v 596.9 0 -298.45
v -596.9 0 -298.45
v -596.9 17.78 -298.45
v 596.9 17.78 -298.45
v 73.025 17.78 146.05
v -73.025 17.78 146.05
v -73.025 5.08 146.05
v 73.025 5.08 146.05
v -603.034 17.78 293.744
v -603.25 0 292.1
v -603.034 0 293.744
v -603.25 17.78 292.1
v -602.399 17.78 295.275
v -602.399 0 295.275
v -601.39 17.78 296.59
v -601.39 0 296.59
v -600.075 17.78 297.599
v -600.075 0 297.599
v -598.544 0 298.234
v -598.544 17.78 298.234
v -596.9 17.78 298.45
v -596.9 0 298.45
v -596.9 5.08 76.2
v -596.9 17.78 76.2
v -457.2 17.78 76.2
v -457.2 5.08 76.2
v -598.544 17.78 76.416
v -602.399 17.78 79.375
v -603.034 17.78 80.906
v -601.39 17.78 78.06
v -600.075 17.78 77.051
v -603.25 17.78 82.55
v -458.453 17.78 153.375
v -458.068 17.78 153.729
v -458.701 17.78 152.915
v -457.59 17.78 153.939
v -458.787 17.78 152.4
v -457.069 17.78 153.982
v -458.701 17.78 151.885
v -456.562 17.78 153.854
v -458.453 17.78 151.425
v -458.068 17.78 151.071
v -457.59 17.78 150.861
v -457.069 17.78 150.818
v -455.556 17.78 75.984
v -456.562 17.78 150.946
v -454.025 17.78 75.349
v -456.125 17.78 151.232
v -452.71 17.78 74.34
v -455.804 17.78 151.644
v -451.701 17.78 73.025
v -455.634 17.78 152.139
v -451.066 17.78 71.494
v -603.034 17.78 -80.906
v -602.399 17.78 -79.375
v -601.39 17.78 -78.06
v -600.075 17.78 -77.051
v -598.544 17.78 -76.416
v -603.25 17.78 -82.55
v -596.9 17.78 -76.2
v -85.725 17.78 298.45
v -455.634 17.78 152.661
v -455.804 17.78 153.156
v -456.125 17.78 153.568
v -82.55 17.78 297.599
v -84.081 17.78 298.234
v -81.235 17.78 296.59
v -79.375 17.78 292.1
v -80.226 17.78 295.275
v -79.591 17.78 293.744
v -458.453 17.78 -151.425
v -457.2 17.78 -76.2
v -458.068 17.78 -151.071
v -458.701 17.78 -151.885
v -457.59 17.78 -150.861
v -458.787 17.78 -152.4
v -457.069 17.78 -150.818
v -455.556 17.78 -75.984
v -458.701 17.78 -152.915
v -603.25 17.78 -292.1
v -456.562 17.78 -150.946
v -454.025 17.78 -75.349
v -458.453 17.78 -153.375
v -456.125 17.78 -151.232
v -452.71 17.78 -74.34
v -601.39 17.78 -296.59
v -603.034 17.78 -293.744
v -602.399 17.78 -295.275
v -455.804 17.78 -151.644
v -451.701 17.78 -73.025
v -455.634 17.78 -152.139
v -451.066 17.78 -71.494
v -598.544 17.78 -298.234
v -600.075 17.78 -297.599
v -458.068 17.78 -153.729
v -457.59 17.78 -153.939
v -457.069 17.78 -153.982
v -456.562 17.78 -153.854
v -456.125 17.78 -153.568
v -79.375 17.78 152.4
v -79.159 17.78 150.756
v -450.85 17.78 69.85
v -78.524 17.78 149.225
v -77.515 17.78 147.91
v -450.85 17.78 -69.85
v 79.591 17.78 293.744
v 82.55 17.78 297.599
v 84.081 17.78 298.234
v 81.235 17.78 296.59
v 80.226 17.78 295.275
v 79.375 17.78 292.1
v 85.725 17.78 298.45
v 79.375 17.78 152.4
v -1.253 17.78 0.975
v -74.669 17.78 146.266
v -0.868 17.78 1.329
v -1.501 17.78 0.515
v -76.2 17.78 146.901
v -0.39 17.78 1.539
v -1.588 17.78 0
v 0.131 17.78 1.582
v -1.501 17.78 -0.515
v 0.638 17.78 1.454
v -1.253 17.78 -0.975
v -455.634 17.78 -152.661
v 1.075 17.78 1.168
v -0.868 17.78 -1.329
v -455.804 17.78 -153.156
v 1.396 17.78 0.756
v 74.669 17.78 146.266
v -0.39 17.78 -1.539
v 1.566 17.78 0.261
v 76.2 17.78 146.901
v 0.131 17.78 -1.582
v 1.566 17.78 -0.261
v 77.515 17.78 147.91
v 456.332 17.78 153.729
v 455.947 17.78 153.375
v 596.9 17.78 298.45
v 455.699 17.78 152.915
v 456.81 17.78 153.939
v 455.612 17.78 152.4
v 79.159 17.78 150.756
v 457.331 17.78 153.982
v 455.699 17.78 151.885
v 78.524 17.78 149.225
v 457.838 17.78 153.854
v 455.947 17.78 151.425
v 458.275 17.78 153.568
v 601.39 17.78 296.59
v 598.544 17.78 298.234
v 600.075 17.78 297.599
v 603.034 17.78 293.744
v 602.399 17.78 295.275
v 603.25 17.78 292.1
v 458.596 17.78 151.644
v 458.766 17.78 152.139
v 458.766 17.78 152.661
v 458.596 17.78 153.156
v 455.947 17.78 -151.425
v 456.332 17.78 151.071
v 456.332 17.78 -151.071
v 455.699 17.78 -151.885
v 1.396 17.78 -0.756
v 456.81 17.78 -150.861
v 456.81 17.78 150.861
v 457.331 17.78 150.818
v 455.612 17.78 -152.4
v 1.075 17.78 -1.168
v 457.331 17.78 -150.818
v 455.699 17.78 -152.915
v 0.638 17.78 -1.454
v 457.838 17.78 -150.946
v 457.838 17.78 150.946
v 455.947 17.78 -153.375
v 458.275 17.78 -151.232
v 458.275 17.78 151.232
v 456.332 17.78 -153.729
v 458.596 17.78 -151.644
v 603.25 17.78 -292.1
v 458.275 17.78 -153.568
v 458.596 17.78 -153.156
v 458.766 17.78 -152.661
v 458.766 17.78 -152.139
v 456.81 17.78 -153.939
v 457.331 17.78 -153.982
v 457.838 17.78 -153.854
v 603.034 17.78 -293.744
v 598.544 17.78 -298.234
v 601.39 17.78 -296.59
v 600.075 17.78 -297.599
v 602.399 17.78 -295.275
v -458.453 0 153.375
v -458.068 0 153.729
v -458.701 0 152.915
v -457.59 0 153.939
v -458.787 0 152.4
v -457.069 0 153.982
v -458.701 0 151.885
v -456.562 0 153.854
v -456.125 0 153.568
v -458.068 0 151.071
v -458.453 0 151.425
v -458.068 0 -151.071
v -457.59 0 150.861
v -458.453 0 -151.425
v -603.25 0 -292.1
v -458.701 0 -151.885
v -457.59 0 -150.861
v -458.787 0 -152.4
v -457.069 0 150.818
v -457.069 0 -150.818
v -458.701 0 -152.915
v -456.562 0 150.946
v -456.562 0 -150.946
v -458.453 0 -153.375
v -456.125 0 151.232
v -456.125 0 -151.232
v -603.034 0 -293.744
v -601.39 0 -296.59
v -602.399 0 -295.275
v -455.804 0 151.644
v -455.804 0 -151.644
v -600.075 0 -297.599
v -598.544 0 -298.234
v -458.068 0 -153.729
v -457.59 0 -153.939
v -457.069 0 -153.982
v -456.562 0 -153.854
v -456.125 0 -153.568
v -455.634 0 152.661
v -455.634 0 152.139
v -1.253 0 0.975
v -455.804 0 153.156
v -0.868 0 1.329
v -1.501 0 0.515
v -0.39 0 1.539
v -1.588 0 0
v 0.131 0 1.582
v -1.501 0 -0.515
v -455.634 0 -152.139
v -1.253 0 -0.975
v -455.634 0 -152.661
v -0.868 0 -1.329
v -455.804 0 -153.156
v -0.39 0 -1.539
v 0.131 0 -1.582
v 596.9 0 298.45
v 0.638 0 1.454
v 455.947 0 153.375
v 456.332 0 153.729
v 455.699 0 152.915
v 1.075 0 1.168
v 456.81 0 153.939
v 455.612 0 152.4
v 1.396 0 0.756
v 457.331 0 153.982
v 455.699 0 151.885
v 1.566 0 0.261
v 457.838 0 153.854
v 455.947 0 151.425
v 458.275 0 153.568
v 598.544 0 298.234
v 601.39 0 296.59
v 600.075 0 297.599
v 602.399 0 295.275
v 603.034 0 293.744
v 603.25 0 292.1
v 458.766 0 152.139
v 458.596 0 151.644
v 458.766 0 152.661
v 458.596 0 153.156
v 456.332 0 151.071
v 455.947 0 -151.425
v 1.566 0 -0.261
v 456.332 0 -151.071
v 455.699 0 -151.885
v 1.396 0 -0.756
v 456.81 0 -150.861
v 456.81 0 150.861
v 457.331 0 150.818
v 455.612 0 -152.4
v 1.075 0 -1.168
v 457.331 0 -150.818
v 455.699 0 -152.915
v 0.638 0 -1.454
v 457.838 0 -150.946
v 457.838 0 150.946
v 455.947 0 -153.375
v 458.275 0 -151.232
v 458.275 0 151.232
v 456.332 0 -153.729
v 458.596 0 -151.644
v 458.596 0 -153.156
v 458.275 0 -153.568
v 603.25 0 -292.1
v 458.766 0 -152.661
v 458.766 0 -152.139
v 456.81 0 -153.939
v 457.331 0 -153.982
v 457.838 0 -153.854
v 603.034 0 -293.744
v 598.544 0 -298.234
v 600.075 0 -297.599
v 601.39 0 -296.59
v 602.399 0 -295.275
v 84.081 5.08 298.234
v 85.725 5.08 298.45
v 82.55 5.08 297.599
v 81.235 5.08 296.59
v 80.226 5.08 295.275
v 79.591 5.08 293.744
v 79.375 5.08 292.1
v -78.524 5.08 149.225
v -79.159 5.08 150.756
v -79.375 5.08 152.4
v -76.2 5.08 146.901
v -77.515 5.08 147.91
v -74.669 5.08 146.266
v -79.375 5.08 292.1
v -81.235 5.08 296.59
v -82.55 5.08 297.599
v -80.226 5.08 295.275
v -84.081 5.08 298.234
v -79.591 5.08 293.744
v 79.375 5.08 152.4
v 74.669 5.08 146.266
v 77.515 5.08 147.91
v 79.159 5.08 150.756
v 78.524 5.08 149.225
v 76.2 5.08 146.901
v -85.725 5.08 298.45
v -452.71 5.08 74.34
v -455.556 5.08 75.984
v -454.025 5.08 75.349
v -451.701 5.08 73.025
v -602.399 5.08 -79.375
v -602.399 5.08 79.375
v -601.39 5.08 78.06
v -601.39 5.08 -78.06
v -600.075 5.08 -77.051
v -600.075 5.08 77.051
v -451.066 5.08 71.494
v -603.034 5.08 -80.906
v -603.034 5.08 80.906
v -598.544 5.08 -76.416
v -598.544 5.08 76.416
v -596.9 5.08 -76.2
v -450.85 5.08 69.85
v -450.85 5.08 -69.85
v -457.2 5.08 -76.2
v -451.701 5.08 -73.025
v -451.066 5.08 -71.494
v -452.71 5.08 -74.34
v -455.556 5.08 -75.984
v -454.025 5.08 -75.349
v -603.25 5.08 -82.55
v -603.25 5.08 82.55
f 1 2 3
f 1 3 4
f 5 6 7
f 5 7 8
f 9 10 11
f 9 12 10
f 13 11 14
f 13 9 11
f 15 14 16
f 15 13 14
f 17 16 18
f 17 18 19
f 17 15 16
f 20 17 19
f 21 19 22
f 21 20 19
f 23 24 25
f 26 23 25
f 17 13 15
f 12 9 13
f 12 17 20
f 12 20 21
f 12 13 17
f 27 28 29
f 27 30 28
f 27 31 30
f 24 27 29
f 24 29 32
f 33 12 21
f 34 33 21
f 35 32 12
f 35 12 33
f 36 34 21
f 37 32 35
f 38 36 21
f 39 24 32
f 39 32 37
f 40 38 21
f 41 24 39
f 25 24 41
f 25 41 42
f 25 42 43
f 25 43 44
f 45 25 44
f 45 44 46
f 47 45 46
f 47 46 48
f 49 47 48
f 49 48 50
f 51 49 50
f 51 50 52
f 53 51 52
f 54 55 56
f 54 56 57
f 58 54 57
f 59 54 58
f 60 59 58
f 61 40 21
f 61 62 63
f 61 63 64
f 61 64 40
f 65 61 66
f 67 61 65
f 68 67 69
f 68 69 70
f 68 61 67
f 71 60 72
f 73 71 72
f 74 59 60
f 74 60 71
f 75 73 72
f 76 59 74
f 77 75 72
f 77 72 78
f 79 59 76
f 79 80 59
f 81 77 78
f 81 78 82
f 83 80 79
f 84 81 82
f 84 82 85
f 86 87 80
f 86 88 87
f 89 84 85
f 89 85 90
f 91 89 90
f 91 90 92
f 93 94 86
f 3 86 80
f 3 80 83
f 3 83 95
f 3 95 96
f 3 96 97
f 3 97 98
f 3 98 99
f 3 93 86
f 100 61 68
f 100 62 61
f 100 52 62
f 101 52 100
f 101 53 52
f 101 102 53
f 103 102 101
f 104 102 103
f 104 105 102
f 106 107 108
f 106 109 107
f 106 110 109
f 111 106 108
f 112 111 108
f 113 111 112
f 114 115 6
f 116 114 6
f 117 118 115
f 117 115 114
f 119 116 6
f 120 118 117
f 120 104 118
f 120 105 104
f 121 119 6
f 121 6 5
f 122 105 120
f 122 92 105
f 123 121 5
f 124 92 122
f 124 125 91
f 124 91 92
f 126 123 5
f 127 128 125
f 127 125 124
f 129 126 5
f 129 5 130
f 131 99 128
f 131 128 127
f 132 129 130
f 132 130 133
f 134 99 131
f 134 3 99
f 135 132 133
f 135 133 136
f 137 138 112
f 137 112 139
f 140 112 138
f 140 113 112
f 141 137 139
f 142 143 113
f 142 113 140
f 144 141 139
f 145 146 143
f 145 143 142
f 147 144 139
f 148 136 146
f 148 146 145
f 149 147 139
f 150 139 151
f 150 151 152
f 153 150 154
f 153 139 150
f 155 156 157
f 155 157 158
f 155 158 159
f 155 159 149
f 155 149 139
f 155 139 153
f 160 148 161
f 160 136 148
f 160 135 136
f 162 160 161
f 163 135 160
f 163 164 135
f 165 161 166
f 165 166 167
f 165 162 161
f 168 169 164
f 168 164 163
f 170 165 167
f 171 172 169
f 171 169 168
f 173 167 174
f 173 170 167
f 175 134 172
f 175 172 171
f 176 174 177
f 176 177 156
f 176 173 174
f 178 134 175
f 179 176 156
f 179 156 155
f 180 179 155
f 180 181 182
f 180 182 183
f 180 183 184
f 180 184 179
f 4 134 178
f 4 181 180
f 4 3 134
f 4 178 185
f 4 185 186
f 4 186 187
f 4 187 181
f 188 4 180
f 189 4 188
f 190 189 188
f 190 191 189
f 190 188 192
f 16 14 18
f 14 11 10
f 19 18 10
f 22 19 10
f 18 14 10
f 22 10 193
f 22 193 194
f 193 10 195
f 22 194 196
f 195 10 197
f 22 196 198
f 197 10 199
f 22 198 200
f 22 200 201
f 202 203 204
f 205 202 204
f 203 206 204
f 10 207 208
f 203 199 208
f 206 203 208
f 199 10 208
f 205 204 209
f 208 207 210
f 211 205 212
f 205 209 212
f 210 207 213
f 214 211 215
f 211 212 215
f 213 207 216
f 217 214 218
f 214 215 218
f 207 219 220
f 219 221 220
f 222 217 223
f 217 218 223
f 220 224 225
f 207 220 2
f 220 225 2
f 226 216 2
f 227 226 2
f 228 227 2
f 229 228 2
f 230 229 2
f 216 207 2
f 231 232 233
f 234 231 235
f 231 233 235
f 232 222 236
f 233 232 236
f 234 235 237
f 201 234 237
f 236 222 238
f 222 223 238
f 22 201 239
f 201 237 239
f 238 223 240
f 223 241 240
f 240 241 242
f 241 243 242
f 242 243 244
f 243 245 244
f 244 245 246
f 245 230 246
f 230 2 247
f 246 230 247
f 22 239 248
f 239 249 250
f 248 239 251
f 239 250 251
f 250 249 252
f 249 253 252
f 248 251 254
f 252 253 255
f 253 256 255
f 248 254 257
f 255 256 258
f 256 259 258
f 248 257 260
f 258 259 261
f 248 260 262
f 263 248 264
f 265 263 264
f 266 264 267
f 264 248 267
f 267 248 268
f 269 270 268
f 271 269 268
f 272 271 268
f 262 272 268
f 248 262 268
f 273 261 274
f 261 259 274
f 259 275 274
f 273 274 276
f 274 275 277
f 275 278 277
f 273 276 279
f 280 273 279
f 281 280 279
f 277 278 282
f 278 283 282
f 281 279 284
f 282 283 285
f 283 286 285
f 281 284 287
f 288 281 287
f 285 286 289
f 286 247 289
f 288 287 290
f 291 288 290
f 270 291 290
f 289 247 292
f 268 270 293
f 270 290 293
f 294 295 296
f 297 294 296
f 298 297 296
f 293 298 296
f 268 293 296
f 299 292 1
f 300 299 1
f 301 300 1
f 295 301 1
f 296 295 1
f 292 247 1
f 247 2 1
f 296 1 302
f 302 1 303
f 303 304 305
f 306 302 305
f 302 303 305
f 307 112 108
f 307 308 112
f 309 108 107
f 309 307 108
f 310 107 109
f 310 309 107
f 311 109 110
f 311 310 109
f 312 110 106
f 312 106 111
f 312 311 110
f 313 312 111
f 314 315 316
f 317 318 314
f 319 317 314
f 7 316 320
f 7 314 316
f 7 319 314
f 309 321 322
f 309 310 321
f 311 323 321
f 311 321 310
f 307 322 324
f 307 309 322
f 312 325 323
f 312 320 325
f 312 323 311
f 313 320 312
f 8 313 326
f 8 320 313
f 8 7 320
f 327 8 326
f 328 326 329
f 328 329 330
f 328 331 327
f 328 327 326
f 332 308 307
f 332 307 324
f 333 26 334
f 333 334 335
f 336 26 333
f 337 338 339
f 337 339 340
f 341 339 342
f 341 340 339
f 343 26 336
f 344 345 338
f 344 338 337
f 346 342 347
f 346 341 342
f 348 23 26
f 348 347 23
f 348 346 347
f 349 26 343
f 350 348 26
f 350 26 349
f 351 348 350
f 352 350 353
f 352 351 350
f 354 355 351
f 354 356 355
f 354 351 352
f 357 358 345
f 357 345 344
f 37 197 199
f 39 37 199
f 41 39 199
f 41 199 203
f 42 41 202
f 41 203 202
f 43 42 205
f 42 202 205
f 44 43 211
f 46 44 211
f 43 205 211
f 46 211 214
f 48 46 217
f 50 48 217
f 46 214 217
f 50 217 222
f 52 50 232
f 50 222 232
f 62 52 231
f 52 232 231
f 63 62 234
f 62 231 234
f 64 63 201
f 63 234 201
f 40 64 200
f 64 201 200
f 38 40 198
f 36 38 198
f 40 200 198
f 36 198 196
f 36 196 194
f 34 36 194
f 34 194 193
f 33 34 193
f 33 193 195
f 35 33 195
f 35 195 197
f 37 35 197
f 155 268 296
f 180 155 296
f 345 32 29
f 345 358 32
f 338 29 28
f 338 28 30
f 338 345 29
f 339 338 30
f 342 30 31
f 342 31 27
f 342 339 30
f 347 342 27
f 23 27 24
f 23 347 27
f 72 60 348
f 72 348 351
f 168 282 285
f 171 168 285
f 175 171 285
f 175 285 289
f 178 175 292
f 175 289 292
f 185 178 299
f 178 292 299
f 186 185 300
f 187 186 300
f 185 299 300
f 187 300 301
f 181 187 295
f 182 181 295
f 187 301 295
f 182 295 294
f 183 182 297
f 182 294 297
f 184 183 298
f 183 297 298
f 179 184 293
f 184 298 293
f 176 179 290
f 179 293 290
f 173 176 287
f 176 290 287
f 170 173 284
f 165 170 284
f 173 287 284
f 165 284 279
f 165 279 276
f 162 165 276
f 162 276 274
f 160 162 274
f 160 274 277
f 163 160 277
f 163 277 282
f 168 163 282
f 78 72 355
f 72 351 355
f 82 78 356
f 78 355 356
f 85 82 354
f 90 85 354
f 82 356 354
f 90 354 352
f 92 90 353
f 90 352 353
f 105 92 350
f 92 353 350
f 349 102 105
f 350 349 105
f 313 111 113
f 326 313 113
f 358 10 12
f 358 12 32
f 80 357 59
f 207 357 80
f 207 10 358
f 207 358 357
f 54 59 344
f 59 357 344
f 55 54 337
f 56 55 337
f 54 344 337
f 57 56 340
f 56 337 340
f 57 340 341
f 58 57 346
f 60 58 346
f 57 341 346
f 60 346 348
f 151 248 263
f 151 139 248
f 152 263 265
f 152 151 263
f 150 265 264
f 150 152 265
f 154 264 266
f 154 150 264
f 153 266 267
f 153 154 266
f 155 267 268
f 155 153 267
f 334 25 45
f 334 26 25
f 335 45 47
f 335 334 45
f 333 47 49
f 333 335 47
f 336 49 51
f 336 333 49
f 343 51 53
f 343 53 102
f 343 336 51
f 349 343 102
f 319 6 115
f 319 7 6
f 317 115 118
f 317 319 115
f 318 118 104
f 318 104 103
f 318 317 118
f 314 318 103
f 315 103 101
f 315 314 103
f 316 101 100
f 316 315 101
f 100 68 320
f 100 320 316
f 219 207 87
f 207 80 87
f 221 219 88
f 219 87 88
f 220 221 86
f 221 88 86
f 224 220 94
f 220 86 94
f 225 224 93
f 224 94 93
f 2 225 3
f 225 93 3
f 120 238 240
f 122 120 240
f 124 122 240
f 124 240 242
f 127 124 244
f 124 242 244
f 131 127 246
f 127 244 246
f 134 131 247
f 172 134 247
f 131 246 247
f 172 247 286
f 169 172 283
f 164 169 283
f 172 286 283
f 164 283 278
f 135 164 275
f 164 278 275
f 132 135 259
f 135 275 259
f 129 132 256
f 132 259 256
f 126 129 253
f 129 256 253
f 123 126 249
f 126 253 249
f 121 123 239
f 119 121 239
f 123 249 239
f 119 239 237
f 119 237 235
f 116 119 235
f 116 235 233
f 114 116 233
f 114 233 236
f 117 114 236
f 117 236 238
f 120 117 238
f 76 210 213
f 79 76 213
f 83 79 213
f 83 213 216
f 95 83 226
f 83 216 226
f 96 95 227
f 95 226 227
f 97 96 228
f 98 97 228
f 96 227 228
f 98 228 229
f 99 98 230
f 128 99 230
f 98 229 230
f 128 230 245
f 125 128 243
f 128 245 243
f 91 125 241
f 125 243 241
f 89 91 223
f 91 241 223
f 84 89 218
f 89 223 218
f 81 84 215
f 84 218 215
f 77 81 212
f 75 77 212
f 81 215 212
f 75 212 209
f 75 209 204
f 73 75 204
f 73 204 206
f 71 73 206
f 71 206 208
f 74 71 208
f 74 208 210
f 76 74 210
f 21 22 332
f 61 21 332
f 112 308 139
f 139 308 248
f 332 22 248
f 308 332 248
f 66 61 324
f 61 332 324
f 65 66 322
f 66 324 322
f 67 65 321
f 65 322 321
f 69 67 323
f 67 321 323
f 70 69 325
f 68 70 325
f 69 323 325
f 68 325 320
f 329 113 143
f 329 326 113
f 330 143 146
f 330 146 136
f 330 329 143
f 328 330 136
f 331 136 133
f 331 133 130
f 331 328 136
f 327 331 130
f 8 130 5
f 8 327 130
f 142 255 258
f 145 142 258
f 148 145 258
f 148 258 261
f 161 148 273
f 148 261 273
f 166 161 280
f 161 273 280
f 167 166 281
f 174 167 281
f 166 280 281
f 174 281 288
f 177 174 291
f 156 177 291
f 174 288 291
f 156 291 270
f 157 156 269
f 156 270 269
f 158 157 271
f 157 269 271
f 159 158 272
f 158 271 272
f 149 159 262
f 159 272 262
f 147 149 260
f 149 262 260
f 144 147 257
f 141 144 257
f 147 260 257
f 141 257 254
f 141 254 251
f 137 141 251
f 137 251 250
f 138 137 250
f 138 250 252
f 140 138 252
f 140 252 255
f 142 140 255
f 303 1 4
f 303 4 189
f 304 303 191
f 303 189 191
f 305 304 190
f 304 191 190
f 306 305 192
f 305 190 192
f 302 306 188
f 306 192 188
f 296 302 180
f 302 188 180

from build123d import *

# Parameters (mm, degrees)
SKETCH1_W                    = 1206.5
SKETCH1_H                    = 596.9
BOSS_EXTRUDE1_DEPTH          = 17.78
F_1_8_0_125_DIAMETER_HOLE1_D = 3.175
FILLET1_R                    = 6.35
SKETCH4_W                    = 158.75
SKETCH4_H                    = 152.4
SKETCH4_W_2                  = 152.4
CUT_EXTRUDE1_DEPTH           = 12.7
FILLET2_R                    = 6.35


with BuildPart() as part:
    # Sketch1 → Boss-Extrude1 (new body)
    with BuildSketch(Plane(origin=(0, 0, 0), x_dir=(1, 0, 0), z_dir=(0, 1, 0))):
        Rectangle(SKETCH1_W, SKETCH1_H)
    extrude(amount=BOSS_EXTRUDE1_DEPTH)

    # 1/8 (0.125) Diameter Hole1 (through all)
    with Locations(Plane(origin=(0, 17.78, 0), x_dir=(1, 0, 0), z_dir=(0, 1, 0))):
        with Locations((0, 0), (457.2, 152.4), (-457.2, -152.4), (-457.2, 152.4), (457.2, -152.4)):
            Hole(F_1_8_0_125_DIAMETER_HOLE1_D / 2)

    # Fillet1
    fillet1_edges = [part.edges().sort_by_distance(p)[0] for p in [
        (603.25, 8.89, 298.45),
        (-603.25, 8.89, 298.45),
        (-603.25, 8.89, -298.45),
        (603.25, 8.89, -298.45),
    ]]
    fillet(fillet1_edges, radius=FILLET1_R)

    # Sketch4 → Cut-Extrude1 (cut)
    with BuildSketch(Plane(origin=(0, 17.78, 0), x_dir=(1, 0, 0), z_dir=(0, 1, 0))):
        with Locations((0, -222.25)):
            Rectangle(SKETCH4_W, SKETCH4_H)
        with Locations((-527.05, 0)):
            Rectangle(SKETCH4_W_2, SKETCH4_H)
    extrude(amount=-CUT_EXTRUDE1_DEPTH, mode=Mode.SUBTRACT)

    # Fillet2
    fillet2_edges = [part.edges().sort_by_distance(p)[0] for p in [
        (79.375, 11.43, 146.05),
        (79.375, 11.43, 298.45),
        (-79.375, 11.43, 298.45),
        (-79.375, 11.43, 146.05),
        (-603.25, 11.43, 76.2),
        (-603.25, 11.43, -76.2),
        (-450.85, 11.43, -76.2),
        (-450.85, 11.43, 76.2),
    ]]
    fillet(fillet2_edges, radius=FILLET2_R)


solid = part.part
